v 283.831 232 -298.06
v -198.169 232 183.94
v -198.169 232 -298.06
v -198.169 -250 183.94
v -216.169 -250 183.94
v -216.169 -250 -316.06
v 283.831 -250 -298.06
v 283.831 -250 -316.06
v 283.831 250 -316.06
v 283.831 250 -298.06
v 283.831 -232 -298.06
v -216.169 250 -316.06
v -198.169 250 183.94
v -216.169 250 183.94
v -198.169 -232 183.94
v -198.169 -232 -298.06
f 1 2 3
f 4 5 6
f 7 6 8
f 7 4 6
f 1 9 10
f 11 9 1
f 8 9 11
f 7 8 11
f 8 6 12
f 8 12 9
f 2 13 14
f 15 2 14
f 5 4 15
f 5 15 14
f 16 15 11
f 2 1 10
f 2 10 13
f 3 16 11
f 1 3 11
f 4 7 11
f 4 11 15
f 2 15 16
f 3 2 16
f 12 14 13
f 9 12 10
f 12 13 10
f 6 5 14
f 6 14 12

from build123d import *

# Parameters (mm, degrees)
F1_DEPTH = 250
F2_DEPTH = 232


with BuildPart() as f1:
    # F0 (on Front) → F1 (new body, symmetric)
    with BuildSketch(Plane.XZ):
        Polygon((-198.168553, 183.939874), (-216.168553, 183.939874), (-216.168553, -316.060126), (283.831447, -316.060126), (283.831447, -298.060126), (-198.168553, -298.060126), align=None)
        Polygon((283.831447, -298.060126), (-198.168553, 183.939874), (-198.168553, -298.060126), align=None)
    extrude(amount=F1_DEPTH, both=True)

    # F0 (on Front) → F2 (cut, symmetric)
    with BuildSketch(Plane.XZ):
        Polygon((283.831447, 183.939874), (-198.168553, 183.939874), (283.831447, -298.060126), align=None)
        Polygon((283.831447, -298.060126), (-198.168553, 183.939874), (-198.168553, -298.060126), align=None)
    extrude(amount=F2_DEPTH, both=True, mode=Mode.SUBTRACT)


solid = f1.part
